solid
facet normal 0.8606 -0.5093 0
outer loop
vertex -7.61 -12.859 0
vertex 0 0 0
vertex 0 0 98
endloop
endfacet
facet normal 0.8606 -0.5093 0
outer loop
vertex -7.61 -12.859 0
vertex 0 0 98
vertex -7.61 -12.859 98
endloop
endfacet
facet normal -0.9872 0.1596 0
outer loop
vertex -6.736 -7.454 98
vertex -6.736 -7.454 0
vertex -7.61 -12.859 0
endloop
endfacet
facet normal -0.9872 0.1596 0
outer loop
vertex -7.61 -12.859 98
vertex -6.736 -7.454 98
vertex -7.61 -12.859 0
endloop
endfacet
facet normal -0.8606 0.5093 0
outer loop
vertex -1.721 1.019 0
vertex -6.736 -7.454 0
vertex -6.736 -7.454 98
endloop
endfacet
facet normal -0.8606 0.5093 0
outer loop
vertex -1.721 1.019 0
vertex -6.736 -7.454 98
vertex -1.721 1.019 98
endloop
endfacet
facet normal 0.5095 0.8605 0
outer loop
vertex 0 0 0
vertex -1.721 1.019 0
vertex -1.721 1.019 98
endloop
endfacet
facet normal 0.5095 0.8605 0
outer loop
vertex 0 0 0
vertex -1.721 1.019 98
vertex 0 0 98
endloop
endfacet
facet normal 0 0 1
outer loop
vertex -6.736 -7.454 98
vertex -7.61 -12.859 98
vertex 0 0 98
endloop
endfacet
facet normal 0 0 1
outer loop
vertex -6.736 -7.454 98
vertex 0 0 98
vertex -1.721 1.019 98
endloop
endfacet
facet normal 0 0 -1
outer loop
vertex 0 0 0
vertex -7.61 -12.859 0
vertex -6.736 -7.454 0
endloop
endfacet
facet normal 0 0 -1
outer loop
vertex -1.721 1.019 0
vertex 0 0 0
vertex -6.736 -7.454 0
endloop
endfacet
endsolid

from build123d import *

# Parameters (mm, degrees)
RESSALTO_EXTRUS_O1_DEPTH = 98
CHANFRO1_SIZE            = 2
CORTE_EXTRUS_O1_DEPTH    = 108


with BuildPart() as part:
    # Esboço1 → Ressalto-extrusão1 (new body)
    with BuildSketch(Plane.XY):
        Polygon((0, 0), (-7.610404057, -12.859217835), (-9.331566424, -11.840591257), (-1.721162367, 1.018626578), align=None)
    extrude(amount=RESSALTO_EXTRUS_O1_DEPTH)

    # Chanfro1
    chanfro1_edges = [part.edges().sort_by_distance(p)[0] for p in [
        (-9.331566424, -11.840591257, 49),
    ]]
    chamfer(chanfro1_edges, length=CHANFRO1_SIZE - 0.0001)  # a hair under: the kernel refuses the full size

    # Esboço2 → Corte-extrusão1 (cut)
    with BuildSketch(Plane(origin=(0, 0, 0), x_dir=(-1, 0, 0), z_dir=(0, 0, -1))):
        Polygon((6.735745015, -7.454459757), (7.610404057, -12.859217835), (9.393966164, -10.156838796), align=None)
    extrude(amount=-CORTE_EXTRUS_O1_DEPTH, mode=Mode.SUBTRACT)


solid = part.part
